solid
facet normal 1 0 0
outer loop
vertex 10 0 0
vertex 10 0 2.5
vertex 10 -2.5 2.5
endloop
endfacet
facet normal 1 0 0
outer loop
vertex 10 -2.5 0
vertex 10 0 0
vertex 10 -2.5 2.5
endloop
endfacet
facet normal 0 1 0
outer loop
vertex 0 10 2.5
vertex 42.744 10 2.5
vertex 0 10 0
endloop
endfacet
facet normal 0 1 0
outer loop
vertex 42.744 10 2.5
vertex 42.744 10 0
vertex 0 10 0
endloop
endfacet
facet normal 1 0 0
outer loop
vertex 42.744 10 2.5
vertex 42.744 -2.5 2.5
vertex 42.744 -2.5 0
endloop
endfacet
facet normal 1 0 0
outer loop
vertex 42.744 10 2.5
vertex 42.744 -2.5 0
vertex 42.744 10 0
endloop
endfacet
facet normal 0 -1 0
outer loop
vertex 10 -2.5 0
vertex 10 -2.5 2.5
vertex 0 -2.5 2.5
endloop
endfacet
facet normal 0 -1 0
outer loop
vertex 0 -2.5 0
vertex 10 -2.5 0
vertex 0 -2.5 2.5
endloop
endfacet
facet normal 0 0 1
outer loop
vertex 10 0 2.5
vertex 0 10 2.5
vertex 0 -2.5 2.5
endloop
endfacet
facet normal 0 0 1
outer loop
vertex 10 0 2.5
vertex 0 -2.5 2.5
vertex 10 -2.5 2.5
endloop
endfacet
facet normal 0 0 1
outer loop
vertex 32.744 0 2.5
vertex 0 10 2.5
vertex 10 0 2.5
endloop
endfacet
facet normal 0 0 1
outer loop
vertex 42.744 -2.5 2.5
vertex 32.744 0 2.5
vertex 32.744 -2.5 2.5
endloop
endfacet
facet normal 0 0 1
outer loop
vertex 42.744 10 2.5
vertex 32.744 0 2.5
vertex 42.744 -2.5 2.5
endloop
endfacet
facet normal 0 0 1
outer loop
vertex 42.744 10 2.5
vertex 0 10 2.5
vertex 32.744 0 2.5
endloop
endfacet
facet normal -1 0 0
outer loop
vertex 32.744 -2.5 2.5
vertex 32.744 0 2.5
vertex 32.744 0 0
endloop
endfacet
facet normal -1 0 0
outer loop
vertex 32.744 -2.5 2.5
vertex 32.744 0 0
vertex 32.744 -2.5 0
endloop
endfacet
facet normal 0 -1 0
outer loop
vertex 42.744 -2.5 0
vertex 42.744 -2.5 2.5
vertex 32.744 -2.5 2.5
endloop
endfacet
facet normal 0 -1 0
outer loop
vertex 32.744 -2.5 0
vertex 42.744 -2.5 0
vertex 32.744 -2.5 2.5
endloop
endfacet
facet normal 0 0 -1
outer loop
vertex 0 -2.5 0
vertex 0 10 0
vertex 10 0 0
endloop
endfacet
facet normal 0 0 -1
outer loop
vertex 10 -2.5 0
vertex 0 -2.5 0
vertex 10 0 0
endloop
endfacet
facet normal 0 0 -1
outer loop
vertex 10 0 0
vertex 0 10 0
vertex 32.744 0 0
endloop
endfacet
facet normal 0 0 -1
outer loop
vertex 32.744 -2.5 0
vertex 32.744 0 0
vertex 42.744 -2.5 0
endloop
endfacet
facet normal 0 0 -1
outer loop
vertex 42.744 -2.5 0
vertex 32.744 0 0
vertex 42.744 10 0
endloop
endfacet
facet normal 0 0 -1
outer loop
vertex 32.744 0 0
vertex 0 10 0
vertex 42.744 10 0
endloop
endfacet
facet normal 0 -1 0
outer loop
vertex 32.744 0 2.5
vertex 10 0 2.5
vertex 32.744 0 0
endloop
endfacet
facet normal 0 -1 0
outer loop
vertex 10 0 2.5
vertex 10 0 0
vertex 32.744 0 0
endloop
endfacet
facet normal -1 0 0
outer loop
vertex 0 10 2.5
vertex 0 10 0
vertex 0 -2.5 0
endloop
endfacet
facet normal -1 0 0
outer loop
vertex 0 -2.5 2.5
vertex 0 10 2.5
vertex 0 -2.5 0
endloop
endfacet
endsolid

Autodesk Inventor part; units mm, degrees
ref_plane "YZ Plane" through (0, 0, 0) normal (1, 0, 0) x (0, 1, 0)
ref_plane "XZ Plane" through (0, 0, 0) normal (0, 1, 0) x (-1, 0, 0)
ref_plane "XY Plane" through (0, 0, 0) normal (0, 0, 1) x (1, 0, 0)
sketch "スケッチ1" plane through (0, 0, 0) normal (0, 0, 1) x (1, 0, 0)
  line L0 (0, 0) -> (50, 0)
  line L1 (50, 0) -> (50, 10)
  line L2 (50, 10) -> (0, 10)
  line L3 (0, 10) -> (0, 0)
  dimension "d0" = 50
  dimension "d1" = 10
extrude "押し出し1" add sketch "スケッチ1" along normal blind 2.5
sketch "スケッチ2" plane through (0, 0, 2.5) normal (0, 0, 1) x (1, 0, 0)
  line L0 (10, -2.5) -> (0, -2.5) projected
  line L1 (10, 0) -> (10, -2.5) projected
  line L2 (0, 0) -> (10, 0) projected
  line L3 (0, 0) -> (0, -2.5) projected
  line L4 (42.7436, -2.5) -> (32.7436, -2.5) projected
  line L5 (42.7436, 0) -> (42.7436, -2.5) projected
  line L6 (32.7436, 0) -> (42.7436, 0) projected
  line L7 (32.7436, 0) -> (32.7436, -2.5) projected
  line L8 (42.7436, 0) -> (42.7436, 10)
  line L9 (50, 0) -> (50, 10) projected
  line L10 (50, 10) -> (0, 10) projected
  line L11 (0, 10) -> (0, 0) projected
  line L12 (0, 0) -> (50, 0) projected
extrude "押し出し2" cut sketch "スケッチ2" against normal through all contours L8 L10 L9 L12
sketch "スケッチ3" plane through (0, 0, 2.5) normal (0, 0, 1) x (1, 0, 0)
  line L0 (10, -2.5) -> (0, -2.5) projected
  line L1 (10, 0) -> (10, -2.5) projected
  line L2 (0, 0) -> (10, 0) projected
  line L3 (0, 0) -> (0, -2.5) projected
  line L4 (42.7436, -2.5) -> (32.7436, -2.5) projected
  line L5 (42.7436, 0) -> (42.7436, -2.5) projected
  line L6 (32.7436, 0) -> (42.7436, 0) projected
  line L7 (32.7436, 0) -> (32.7436, -2.5) projected
extrude "押し出し3" add sketch "スケッチ3" against normal up to surface (2.5 mm away)
properties part number "皿_壁"
